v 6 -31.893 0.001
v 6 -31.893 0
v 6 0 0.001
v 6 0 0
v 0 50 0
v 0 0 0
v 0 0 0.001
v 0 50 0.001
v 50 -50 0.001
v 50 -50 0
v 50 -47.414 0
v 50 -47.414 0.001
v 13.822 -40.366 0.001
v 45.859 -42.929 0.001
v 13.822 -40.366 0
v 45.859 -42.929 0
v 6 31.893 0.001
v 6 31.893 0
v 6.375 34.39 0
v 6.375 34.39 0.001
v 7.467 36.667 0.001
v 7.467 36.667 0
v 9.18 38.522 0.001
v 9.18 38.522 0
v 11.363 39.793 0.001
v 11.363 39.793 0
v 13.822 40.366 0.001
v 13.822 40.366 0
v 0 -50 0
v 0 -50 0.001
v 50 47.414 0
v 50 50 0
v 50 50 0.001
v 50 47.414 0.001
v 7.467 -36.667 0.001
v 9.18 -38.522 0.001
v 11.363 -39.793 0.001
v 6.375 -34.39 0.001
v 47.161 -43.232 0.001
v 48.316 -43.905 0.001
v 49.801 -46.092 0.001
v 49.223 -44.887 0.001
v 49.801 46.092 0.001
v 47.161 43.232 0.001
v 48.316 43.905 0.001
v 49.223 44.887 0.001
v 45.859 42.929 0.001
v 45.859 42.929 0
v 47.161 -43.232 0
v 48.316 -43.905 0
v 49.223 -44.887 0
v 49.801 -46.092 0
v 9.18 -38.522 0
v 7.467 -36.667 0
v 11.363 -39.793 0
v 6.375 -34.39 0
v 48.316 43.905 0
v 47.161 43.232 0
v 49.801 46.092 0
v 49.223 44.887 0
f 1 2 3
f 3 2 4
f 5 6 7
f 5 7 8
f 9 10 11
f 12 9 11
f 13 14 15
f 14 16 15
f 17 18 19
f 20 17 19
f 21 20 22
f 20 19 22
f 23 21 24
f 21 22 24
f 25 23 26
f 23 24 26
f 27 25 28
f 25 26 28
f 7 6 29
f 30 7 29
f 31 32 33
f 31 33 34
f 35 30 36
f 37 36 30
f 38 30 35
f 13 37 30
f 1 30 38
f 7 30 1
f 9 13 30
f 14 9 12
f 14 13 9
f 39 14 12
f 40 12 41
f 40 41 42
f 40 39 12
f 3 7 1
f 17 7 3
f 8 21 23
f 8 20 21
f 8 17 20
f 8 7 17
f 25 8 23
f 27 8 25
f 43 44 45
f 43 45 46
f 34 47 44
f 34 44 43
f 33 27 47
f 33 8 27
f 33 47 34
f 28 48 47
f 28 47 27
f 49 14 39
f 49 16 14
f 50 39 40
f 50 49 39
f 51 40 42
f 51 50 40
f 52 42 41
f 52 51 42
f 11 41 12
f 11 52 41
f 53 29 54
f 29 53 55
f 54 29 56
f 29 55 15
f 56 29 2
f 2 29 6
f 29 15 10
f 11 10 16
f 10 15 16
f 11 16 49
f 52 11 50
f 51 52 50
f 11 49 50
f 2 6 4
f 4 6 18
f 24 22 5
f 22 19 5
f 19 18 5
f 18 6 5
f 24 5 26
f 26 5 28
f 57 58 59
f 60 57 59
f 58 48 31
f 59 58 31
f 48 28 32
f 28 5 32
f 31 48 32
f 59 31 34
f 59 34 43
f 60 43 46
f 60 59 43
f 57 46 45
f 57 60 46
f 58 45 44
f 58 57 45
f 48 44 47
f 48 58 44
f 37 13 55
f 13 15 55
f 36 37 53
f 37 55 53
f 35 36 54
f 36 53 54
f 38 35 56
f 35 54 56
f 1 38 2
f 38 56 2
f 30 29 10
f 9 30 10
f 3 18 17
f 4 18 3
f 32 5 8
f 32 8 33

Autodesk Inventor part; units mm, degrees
ref_plane "YZ Plane" through (0, 0, 0) normal (1, 0, 0) x (0, 1, 0)
ref_plane "Start plane" through (0, 0, 0) normal (0, 0, 1) x (1, 0, 0)
ref_plane "End plane" through (0, 0, 0.001) normal (0, 0, 1) x (1, 0, 0)
sketch "Sketch" plane through (0, 0, 0) normal (0, 0, 1) x (1, 0, 0)
  line L0 (0, 0) -> (0, 50)
  line L1 (0, 50) -> (50, 50)
  line L2 (50, 50) -> (50, 47.4144)
  line L3 (45.8589, 42.9287) -> (13.8222, 40.3658)
  line L4 (6, 31.8928) -> (6, 0)
  line L5 (6, 0) -> (0, 0) construction
  line L6 (28, 50) -> (28, 41.5) construction
  line L7 (50, 43.26) -> (50, 41.5) construction
  line L8 (50, 41.5) -> (28, 41.5) construction
  line L9 (0, 15) -> (0, -27) construction
  line L10 (-5.539, 0) -> (16.0067, 0) construction
  line L11 (0, 0) -> (0, -50)
  line L12 (0, -50) -> (50, -50)
  line L13 (50, -50) -> (50, -47.4144)
  line L14 (45.8589, -42.9287) -> (13.8222, -40.3658)
  line L15 (6, -31.8928) -> (6, 0)
  arc A0 (13.8222, 40.3658) -> (6, 31.8928) centre (14.5, 31.8928) ccw
  arc A1 (6, -31.8928) -> (13.8222, -40.3658) centre (14.5, -31.8928) ccw
  arc A2 (45.8589, 42.9287) -> (50, 47.4144) centre (45.5, 47.4144) ccw
  arc A3 (50, -47.4144) -> (45.8589, -42.9287) centre (45.5, -47.4144) ccw
  line L16 (0, 23.4) -> (0, -35.4) construction
  line L17 (-9.8481, 0) -> (20.3158, 0) construction
  point P0 (6, 39.74)
  point P1 (50, -43.26)
  point P2 (6, -39.74)
  point P3 (28, -50)
  point P4 (28, -41.5)
  dimension "d0" = 6
  dimension "d1" = 50
  dimension "d2" = 50
  dimension "d3" = 8.5
  dimension "d4" = 22
  dimension "d5" = 1.76
  dimension "d23" = 8.5
  dimension "d24" = 4.5
  dimension "d25" = 0
extrude "Body" add sketch "Sketch" along normal up to surface (0.001 mm away) from surface at 0
sketch "Sketch3" plane through (0, 0, 0) normal (0, 0, 1) x (1, 0, 0)
  line L0 (0, 0) -> (10, 0)
ref_plane "Work Plane3" through (0, 0, 0) normal (0, -1, 0) x (1, 0, 0)
sketch "Sketch4" plane through (0, 0, 0) normal (0, -1, 0) x (1, 0, 0)
  line L0 (-2, 0) -> (12, 0)
  line L1 (-2, 0.001) -> (12, 0.001)
  dimension "d29" = 0.001
equation "\"d0\" = G_T"
equation "\"d1\" = 0.5 * G_H"
equation "\"d2\" = G_W"
equation "\"d3\" = G_T1"
equation "\"d4\" = G_C"
equation "\"d23\" = G_IR"
equation "\"d24\" = G_ER"
equation "\"d6\" = G_L"
equation "\"G_W\" = 50"
equation "\"G_T\" = 6"
equation "\"G_T1\" = 8.5"
equation "\"G_NG\" = 0.08"
equation "\"G_ER\" = 4.5"
equation "\"G_IR\" = 8.5"
equation "\"G_C\" = 22"
equation "\"G_L\" = d29"
equation "\"ex\" = 0"
equation "\"G_OFFSET_START\" = 0"
equation "\"G_OFFSET_END\" = 0"
equation "\"d27\" = G_OFFSET_END + B_L"
equation "\"B_L\" = 0.001"
equation "\"G_H\" = 100"
properties part number "PN-86/H-93403 - C 100x50 - 0,001" material "Steel, Mild"
